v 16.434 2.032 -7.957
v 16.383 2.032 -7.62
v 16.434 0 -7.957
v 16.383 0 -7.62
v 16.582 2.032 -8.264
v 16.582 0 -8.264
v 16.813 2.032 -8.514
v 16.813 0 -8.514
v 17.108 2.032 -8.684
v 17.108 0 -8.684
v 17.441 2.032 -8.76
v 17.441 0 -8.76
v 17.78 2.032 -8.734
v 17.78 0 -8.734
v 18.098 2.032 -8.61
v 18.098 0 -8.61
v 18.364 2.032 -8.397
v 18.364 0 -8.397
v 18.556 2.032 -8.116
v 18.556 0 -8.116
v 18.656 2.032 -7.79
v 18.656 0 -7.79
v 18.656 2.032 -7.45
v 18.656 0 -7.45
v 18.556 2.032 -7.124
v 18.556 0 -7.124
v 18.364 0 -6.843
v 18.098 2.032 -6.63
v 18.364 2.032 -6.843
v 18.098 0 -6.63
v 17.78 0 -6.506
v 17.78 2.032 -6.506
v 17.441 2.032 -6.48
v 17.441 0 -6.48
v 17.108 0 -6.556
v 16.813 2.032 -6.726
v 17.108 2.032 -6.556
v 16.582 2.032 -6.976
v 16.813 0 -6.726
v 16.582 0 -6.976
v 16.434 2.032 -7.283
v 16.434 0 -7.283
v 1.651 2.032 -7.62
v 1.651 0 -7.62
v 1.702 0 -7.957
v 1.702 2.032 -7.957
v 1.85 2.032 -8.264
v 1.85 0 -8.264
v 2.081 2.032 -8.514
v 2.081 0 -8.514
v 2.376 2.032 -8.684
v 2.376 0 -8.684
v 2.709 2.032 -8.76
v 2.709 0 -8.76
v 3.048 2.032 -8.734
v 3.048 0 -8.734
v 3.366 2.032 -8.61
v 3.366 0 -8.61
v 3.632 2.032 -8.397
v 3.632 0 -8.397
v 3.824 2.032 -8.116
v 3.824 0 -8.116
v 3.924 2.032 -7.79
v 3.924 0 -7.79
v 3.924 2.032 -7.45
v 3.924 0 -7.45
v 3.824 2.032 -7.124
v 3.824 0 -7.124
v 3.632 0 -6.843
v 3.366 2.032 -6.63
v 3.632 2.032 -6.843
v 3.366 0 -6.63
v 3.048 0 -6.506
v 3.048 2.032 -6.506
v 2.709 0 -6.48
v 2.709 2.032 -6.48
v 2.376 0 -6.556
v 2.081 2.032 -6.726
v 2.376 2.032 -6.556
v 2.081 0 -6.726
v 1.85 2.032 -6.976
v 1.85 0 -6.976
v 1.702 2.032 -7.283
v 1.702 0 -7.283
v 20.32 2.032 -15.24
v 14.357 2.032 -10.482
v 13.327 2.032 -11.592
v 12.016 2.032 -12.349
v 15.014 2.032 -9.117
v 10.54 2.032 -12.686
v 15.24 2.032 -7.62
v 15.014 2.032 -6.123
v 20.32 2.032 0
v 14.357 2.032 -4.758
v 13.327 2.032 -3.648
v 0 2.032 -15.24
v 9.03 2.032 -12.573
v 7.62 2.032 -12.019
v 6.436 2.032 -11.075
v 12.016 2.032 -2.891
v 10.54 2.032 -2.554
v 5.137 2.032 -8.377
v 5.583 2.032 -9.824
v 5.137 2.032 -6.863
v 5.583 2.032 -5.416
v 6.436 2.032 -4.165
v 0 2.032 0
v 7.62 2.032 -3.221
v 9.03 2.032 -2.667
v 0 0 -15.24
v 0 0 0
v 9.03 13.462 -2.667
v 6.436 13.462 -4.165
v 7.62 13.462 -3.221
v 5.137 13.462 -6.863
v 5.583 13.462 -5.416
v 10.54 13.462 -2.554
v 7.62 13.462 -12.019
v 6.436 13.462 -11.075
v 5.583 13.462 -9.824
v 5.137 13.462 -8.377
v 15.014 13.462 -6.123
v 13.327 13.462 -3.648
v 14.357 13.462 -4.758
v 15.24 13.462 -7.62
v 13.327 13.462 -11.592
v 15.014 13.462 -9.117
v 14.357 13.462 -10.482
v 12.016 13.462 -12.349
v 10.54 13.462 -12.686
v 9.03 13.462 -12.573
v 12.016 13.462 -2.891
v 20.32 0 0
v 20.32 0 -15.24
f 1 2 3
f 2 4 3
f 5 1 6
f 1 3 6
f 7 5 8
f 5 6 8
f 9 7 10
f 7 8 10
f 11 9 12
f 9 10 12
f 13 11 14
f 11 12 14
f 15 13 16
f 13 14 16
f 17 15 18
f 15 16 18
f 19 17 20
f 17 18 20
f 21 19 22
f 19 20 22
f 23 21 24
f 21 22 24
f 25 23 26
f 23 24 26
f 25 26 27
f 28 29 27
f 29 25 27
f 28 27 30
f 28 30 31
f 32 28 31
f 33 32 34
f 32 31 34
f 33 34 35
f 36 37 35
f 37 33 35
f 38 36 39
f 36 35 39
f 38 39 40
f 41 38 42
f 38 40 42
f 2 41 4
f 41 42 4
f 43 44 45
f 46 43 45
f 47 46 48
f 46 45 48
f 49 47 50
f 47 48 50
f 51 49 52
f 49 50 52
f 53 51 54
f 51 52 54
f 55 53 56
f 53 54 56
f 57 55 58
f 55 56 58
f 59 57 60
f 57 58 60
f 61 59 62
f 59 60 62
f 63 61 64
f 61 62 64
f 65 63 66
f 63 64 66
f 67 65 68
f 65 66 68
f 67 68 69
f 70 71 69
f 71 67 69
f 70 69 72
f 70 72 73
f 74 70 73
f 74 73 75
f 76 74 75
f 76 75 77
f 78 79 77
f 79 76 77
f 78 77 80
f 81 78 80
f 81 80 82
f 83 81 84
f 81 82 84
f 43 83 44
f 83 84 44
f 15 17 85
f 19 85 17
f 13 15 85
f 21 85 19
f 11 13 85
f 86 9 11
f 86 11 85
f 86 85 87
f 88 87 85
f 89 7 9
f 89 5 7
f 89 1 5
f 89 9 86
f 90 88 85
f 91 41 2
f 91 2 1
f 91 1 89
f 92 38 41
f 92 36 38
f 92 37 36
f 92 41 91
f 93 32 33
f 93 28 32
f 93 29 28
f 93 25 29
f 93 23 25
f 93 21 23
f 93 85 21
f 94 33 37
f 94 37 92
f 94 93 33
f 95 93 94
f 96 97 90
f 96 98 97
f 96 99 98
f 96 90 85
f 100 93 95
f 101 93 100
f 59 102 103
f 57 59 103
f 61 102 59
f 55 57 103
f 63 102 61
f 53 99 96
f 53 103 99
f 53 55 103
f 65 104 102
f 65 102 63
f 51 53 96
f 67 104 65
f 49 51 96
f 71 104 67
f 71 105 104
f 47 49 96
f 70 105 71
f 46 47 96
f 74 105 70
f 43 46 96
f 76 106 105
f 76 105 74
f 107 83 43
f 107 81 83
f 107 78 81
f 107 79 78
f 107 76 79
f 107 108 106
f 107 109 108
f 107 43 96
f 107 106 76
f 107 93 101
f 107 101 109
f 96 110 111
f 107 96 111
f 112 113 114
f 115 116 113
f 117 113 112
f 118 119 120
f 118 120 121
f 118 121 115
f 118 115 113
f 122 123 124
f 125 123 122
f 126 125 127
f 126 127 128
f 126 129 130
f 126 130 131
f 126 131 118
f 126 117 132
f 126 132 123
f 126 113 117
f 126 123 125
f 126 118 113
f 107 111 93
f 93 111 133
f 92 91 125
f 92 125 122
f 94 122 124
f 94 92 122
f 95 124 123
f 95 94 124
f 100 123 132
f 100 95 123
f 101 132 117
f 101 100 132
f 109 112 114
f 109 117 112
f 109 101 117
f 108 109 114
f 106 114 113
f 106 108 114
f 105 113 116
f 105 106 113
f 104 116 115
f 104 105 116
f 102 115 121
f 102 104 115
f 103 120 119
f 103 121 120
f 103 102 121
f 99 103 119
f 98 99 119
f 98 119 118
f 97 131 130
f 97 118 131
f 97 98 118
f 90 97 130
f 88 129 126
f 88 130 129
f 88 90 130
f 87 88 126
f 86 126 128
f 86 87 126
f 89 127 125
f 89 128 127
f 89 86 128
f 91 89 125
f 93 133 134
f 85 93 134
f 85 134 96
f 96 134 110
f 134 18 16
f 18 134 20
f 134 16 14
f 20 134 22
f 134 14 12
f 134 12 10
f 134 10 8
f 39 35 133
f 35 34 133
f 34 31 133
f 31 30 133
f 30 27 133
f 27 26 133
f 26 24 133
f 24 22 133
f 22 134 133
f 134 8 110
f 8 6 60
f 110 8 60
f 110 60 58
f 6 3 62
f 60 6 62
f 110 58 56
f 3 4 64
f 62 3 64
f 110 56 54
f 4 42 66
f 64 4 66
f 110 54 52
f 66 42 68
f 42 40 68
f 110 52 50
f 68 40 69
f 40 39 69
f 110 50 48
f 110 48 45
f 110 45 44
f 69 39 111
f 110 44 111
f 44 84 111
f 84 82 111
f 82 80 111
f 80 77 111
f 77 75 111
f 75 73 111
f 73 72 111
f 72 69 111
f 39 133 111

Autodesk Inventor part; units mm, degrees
ref_plane "YZ Plane" through (0, 0, 0) normal (1, 0, 0) x (0, 1, 0)
ref_plane "XZ Plane" through (0, 0, 0) normal (0, 1, 0) x (-1, 0, 0)
ref_plane "XY Plane" through (0, 0, 0) normal (0, 0, 1) x (1, 0, 0)
sketch "Sketch1" plane through (0, 0, 0) normal (0, 1, 0) x (-1, 0, 0)
  line L0 (0, 0) -> (-20.32, 0)
  line L1 (-20.32, 0) -> (-20.32, -15.24)
  line L2 (-20.32, -15.24) -> (0, -15.24)
  line L3 (0, -15.24) -> (0, 0)
  line L4 (-20.32, -7.62) -> (0, -7.62) construction
  circle A0 centre (-17.526, -7.62) radius 1.143
  circle A1 centre (-2.794, -7.62) radius 1.143
  dimension "d0" = 20.32
  dimension "d1" = 15.24
  dimension "d2" = 14.732
  dimension "d3" = 2.794
  dimension "d4" = 2.286
  dimension "d5" = 2.286
extrude "Extrusion1" add sketch "Sketch1" along normal blind 2.032
sketch "Sketch2" plane through (0, 2.032, 0) normal (0, 1, 0) x (1, 0, 0)
  line L0 (0, 15.24) -> (0, 0) construction
  line L1 (0, 7.62) -> (20.32, 7.62) construction
  line L2 (20.32, 0) -> (20.32, 15.24) construction
  line L3 (20.32, 15.24) -> (0, 15.24) construction
  line L4 (10.16, 15.24) -> (10.16, 0) construction
  line L5 (0, 0) -> (20.32, 0) construction
  circle A0 centre (10.16, 7.62) radius 5.08
  dimension "d8" = 10.16
extrude "Extrusion2" add sketch "Sketch2" along normal blind 11.43
properties part number "half_inch_castor"
